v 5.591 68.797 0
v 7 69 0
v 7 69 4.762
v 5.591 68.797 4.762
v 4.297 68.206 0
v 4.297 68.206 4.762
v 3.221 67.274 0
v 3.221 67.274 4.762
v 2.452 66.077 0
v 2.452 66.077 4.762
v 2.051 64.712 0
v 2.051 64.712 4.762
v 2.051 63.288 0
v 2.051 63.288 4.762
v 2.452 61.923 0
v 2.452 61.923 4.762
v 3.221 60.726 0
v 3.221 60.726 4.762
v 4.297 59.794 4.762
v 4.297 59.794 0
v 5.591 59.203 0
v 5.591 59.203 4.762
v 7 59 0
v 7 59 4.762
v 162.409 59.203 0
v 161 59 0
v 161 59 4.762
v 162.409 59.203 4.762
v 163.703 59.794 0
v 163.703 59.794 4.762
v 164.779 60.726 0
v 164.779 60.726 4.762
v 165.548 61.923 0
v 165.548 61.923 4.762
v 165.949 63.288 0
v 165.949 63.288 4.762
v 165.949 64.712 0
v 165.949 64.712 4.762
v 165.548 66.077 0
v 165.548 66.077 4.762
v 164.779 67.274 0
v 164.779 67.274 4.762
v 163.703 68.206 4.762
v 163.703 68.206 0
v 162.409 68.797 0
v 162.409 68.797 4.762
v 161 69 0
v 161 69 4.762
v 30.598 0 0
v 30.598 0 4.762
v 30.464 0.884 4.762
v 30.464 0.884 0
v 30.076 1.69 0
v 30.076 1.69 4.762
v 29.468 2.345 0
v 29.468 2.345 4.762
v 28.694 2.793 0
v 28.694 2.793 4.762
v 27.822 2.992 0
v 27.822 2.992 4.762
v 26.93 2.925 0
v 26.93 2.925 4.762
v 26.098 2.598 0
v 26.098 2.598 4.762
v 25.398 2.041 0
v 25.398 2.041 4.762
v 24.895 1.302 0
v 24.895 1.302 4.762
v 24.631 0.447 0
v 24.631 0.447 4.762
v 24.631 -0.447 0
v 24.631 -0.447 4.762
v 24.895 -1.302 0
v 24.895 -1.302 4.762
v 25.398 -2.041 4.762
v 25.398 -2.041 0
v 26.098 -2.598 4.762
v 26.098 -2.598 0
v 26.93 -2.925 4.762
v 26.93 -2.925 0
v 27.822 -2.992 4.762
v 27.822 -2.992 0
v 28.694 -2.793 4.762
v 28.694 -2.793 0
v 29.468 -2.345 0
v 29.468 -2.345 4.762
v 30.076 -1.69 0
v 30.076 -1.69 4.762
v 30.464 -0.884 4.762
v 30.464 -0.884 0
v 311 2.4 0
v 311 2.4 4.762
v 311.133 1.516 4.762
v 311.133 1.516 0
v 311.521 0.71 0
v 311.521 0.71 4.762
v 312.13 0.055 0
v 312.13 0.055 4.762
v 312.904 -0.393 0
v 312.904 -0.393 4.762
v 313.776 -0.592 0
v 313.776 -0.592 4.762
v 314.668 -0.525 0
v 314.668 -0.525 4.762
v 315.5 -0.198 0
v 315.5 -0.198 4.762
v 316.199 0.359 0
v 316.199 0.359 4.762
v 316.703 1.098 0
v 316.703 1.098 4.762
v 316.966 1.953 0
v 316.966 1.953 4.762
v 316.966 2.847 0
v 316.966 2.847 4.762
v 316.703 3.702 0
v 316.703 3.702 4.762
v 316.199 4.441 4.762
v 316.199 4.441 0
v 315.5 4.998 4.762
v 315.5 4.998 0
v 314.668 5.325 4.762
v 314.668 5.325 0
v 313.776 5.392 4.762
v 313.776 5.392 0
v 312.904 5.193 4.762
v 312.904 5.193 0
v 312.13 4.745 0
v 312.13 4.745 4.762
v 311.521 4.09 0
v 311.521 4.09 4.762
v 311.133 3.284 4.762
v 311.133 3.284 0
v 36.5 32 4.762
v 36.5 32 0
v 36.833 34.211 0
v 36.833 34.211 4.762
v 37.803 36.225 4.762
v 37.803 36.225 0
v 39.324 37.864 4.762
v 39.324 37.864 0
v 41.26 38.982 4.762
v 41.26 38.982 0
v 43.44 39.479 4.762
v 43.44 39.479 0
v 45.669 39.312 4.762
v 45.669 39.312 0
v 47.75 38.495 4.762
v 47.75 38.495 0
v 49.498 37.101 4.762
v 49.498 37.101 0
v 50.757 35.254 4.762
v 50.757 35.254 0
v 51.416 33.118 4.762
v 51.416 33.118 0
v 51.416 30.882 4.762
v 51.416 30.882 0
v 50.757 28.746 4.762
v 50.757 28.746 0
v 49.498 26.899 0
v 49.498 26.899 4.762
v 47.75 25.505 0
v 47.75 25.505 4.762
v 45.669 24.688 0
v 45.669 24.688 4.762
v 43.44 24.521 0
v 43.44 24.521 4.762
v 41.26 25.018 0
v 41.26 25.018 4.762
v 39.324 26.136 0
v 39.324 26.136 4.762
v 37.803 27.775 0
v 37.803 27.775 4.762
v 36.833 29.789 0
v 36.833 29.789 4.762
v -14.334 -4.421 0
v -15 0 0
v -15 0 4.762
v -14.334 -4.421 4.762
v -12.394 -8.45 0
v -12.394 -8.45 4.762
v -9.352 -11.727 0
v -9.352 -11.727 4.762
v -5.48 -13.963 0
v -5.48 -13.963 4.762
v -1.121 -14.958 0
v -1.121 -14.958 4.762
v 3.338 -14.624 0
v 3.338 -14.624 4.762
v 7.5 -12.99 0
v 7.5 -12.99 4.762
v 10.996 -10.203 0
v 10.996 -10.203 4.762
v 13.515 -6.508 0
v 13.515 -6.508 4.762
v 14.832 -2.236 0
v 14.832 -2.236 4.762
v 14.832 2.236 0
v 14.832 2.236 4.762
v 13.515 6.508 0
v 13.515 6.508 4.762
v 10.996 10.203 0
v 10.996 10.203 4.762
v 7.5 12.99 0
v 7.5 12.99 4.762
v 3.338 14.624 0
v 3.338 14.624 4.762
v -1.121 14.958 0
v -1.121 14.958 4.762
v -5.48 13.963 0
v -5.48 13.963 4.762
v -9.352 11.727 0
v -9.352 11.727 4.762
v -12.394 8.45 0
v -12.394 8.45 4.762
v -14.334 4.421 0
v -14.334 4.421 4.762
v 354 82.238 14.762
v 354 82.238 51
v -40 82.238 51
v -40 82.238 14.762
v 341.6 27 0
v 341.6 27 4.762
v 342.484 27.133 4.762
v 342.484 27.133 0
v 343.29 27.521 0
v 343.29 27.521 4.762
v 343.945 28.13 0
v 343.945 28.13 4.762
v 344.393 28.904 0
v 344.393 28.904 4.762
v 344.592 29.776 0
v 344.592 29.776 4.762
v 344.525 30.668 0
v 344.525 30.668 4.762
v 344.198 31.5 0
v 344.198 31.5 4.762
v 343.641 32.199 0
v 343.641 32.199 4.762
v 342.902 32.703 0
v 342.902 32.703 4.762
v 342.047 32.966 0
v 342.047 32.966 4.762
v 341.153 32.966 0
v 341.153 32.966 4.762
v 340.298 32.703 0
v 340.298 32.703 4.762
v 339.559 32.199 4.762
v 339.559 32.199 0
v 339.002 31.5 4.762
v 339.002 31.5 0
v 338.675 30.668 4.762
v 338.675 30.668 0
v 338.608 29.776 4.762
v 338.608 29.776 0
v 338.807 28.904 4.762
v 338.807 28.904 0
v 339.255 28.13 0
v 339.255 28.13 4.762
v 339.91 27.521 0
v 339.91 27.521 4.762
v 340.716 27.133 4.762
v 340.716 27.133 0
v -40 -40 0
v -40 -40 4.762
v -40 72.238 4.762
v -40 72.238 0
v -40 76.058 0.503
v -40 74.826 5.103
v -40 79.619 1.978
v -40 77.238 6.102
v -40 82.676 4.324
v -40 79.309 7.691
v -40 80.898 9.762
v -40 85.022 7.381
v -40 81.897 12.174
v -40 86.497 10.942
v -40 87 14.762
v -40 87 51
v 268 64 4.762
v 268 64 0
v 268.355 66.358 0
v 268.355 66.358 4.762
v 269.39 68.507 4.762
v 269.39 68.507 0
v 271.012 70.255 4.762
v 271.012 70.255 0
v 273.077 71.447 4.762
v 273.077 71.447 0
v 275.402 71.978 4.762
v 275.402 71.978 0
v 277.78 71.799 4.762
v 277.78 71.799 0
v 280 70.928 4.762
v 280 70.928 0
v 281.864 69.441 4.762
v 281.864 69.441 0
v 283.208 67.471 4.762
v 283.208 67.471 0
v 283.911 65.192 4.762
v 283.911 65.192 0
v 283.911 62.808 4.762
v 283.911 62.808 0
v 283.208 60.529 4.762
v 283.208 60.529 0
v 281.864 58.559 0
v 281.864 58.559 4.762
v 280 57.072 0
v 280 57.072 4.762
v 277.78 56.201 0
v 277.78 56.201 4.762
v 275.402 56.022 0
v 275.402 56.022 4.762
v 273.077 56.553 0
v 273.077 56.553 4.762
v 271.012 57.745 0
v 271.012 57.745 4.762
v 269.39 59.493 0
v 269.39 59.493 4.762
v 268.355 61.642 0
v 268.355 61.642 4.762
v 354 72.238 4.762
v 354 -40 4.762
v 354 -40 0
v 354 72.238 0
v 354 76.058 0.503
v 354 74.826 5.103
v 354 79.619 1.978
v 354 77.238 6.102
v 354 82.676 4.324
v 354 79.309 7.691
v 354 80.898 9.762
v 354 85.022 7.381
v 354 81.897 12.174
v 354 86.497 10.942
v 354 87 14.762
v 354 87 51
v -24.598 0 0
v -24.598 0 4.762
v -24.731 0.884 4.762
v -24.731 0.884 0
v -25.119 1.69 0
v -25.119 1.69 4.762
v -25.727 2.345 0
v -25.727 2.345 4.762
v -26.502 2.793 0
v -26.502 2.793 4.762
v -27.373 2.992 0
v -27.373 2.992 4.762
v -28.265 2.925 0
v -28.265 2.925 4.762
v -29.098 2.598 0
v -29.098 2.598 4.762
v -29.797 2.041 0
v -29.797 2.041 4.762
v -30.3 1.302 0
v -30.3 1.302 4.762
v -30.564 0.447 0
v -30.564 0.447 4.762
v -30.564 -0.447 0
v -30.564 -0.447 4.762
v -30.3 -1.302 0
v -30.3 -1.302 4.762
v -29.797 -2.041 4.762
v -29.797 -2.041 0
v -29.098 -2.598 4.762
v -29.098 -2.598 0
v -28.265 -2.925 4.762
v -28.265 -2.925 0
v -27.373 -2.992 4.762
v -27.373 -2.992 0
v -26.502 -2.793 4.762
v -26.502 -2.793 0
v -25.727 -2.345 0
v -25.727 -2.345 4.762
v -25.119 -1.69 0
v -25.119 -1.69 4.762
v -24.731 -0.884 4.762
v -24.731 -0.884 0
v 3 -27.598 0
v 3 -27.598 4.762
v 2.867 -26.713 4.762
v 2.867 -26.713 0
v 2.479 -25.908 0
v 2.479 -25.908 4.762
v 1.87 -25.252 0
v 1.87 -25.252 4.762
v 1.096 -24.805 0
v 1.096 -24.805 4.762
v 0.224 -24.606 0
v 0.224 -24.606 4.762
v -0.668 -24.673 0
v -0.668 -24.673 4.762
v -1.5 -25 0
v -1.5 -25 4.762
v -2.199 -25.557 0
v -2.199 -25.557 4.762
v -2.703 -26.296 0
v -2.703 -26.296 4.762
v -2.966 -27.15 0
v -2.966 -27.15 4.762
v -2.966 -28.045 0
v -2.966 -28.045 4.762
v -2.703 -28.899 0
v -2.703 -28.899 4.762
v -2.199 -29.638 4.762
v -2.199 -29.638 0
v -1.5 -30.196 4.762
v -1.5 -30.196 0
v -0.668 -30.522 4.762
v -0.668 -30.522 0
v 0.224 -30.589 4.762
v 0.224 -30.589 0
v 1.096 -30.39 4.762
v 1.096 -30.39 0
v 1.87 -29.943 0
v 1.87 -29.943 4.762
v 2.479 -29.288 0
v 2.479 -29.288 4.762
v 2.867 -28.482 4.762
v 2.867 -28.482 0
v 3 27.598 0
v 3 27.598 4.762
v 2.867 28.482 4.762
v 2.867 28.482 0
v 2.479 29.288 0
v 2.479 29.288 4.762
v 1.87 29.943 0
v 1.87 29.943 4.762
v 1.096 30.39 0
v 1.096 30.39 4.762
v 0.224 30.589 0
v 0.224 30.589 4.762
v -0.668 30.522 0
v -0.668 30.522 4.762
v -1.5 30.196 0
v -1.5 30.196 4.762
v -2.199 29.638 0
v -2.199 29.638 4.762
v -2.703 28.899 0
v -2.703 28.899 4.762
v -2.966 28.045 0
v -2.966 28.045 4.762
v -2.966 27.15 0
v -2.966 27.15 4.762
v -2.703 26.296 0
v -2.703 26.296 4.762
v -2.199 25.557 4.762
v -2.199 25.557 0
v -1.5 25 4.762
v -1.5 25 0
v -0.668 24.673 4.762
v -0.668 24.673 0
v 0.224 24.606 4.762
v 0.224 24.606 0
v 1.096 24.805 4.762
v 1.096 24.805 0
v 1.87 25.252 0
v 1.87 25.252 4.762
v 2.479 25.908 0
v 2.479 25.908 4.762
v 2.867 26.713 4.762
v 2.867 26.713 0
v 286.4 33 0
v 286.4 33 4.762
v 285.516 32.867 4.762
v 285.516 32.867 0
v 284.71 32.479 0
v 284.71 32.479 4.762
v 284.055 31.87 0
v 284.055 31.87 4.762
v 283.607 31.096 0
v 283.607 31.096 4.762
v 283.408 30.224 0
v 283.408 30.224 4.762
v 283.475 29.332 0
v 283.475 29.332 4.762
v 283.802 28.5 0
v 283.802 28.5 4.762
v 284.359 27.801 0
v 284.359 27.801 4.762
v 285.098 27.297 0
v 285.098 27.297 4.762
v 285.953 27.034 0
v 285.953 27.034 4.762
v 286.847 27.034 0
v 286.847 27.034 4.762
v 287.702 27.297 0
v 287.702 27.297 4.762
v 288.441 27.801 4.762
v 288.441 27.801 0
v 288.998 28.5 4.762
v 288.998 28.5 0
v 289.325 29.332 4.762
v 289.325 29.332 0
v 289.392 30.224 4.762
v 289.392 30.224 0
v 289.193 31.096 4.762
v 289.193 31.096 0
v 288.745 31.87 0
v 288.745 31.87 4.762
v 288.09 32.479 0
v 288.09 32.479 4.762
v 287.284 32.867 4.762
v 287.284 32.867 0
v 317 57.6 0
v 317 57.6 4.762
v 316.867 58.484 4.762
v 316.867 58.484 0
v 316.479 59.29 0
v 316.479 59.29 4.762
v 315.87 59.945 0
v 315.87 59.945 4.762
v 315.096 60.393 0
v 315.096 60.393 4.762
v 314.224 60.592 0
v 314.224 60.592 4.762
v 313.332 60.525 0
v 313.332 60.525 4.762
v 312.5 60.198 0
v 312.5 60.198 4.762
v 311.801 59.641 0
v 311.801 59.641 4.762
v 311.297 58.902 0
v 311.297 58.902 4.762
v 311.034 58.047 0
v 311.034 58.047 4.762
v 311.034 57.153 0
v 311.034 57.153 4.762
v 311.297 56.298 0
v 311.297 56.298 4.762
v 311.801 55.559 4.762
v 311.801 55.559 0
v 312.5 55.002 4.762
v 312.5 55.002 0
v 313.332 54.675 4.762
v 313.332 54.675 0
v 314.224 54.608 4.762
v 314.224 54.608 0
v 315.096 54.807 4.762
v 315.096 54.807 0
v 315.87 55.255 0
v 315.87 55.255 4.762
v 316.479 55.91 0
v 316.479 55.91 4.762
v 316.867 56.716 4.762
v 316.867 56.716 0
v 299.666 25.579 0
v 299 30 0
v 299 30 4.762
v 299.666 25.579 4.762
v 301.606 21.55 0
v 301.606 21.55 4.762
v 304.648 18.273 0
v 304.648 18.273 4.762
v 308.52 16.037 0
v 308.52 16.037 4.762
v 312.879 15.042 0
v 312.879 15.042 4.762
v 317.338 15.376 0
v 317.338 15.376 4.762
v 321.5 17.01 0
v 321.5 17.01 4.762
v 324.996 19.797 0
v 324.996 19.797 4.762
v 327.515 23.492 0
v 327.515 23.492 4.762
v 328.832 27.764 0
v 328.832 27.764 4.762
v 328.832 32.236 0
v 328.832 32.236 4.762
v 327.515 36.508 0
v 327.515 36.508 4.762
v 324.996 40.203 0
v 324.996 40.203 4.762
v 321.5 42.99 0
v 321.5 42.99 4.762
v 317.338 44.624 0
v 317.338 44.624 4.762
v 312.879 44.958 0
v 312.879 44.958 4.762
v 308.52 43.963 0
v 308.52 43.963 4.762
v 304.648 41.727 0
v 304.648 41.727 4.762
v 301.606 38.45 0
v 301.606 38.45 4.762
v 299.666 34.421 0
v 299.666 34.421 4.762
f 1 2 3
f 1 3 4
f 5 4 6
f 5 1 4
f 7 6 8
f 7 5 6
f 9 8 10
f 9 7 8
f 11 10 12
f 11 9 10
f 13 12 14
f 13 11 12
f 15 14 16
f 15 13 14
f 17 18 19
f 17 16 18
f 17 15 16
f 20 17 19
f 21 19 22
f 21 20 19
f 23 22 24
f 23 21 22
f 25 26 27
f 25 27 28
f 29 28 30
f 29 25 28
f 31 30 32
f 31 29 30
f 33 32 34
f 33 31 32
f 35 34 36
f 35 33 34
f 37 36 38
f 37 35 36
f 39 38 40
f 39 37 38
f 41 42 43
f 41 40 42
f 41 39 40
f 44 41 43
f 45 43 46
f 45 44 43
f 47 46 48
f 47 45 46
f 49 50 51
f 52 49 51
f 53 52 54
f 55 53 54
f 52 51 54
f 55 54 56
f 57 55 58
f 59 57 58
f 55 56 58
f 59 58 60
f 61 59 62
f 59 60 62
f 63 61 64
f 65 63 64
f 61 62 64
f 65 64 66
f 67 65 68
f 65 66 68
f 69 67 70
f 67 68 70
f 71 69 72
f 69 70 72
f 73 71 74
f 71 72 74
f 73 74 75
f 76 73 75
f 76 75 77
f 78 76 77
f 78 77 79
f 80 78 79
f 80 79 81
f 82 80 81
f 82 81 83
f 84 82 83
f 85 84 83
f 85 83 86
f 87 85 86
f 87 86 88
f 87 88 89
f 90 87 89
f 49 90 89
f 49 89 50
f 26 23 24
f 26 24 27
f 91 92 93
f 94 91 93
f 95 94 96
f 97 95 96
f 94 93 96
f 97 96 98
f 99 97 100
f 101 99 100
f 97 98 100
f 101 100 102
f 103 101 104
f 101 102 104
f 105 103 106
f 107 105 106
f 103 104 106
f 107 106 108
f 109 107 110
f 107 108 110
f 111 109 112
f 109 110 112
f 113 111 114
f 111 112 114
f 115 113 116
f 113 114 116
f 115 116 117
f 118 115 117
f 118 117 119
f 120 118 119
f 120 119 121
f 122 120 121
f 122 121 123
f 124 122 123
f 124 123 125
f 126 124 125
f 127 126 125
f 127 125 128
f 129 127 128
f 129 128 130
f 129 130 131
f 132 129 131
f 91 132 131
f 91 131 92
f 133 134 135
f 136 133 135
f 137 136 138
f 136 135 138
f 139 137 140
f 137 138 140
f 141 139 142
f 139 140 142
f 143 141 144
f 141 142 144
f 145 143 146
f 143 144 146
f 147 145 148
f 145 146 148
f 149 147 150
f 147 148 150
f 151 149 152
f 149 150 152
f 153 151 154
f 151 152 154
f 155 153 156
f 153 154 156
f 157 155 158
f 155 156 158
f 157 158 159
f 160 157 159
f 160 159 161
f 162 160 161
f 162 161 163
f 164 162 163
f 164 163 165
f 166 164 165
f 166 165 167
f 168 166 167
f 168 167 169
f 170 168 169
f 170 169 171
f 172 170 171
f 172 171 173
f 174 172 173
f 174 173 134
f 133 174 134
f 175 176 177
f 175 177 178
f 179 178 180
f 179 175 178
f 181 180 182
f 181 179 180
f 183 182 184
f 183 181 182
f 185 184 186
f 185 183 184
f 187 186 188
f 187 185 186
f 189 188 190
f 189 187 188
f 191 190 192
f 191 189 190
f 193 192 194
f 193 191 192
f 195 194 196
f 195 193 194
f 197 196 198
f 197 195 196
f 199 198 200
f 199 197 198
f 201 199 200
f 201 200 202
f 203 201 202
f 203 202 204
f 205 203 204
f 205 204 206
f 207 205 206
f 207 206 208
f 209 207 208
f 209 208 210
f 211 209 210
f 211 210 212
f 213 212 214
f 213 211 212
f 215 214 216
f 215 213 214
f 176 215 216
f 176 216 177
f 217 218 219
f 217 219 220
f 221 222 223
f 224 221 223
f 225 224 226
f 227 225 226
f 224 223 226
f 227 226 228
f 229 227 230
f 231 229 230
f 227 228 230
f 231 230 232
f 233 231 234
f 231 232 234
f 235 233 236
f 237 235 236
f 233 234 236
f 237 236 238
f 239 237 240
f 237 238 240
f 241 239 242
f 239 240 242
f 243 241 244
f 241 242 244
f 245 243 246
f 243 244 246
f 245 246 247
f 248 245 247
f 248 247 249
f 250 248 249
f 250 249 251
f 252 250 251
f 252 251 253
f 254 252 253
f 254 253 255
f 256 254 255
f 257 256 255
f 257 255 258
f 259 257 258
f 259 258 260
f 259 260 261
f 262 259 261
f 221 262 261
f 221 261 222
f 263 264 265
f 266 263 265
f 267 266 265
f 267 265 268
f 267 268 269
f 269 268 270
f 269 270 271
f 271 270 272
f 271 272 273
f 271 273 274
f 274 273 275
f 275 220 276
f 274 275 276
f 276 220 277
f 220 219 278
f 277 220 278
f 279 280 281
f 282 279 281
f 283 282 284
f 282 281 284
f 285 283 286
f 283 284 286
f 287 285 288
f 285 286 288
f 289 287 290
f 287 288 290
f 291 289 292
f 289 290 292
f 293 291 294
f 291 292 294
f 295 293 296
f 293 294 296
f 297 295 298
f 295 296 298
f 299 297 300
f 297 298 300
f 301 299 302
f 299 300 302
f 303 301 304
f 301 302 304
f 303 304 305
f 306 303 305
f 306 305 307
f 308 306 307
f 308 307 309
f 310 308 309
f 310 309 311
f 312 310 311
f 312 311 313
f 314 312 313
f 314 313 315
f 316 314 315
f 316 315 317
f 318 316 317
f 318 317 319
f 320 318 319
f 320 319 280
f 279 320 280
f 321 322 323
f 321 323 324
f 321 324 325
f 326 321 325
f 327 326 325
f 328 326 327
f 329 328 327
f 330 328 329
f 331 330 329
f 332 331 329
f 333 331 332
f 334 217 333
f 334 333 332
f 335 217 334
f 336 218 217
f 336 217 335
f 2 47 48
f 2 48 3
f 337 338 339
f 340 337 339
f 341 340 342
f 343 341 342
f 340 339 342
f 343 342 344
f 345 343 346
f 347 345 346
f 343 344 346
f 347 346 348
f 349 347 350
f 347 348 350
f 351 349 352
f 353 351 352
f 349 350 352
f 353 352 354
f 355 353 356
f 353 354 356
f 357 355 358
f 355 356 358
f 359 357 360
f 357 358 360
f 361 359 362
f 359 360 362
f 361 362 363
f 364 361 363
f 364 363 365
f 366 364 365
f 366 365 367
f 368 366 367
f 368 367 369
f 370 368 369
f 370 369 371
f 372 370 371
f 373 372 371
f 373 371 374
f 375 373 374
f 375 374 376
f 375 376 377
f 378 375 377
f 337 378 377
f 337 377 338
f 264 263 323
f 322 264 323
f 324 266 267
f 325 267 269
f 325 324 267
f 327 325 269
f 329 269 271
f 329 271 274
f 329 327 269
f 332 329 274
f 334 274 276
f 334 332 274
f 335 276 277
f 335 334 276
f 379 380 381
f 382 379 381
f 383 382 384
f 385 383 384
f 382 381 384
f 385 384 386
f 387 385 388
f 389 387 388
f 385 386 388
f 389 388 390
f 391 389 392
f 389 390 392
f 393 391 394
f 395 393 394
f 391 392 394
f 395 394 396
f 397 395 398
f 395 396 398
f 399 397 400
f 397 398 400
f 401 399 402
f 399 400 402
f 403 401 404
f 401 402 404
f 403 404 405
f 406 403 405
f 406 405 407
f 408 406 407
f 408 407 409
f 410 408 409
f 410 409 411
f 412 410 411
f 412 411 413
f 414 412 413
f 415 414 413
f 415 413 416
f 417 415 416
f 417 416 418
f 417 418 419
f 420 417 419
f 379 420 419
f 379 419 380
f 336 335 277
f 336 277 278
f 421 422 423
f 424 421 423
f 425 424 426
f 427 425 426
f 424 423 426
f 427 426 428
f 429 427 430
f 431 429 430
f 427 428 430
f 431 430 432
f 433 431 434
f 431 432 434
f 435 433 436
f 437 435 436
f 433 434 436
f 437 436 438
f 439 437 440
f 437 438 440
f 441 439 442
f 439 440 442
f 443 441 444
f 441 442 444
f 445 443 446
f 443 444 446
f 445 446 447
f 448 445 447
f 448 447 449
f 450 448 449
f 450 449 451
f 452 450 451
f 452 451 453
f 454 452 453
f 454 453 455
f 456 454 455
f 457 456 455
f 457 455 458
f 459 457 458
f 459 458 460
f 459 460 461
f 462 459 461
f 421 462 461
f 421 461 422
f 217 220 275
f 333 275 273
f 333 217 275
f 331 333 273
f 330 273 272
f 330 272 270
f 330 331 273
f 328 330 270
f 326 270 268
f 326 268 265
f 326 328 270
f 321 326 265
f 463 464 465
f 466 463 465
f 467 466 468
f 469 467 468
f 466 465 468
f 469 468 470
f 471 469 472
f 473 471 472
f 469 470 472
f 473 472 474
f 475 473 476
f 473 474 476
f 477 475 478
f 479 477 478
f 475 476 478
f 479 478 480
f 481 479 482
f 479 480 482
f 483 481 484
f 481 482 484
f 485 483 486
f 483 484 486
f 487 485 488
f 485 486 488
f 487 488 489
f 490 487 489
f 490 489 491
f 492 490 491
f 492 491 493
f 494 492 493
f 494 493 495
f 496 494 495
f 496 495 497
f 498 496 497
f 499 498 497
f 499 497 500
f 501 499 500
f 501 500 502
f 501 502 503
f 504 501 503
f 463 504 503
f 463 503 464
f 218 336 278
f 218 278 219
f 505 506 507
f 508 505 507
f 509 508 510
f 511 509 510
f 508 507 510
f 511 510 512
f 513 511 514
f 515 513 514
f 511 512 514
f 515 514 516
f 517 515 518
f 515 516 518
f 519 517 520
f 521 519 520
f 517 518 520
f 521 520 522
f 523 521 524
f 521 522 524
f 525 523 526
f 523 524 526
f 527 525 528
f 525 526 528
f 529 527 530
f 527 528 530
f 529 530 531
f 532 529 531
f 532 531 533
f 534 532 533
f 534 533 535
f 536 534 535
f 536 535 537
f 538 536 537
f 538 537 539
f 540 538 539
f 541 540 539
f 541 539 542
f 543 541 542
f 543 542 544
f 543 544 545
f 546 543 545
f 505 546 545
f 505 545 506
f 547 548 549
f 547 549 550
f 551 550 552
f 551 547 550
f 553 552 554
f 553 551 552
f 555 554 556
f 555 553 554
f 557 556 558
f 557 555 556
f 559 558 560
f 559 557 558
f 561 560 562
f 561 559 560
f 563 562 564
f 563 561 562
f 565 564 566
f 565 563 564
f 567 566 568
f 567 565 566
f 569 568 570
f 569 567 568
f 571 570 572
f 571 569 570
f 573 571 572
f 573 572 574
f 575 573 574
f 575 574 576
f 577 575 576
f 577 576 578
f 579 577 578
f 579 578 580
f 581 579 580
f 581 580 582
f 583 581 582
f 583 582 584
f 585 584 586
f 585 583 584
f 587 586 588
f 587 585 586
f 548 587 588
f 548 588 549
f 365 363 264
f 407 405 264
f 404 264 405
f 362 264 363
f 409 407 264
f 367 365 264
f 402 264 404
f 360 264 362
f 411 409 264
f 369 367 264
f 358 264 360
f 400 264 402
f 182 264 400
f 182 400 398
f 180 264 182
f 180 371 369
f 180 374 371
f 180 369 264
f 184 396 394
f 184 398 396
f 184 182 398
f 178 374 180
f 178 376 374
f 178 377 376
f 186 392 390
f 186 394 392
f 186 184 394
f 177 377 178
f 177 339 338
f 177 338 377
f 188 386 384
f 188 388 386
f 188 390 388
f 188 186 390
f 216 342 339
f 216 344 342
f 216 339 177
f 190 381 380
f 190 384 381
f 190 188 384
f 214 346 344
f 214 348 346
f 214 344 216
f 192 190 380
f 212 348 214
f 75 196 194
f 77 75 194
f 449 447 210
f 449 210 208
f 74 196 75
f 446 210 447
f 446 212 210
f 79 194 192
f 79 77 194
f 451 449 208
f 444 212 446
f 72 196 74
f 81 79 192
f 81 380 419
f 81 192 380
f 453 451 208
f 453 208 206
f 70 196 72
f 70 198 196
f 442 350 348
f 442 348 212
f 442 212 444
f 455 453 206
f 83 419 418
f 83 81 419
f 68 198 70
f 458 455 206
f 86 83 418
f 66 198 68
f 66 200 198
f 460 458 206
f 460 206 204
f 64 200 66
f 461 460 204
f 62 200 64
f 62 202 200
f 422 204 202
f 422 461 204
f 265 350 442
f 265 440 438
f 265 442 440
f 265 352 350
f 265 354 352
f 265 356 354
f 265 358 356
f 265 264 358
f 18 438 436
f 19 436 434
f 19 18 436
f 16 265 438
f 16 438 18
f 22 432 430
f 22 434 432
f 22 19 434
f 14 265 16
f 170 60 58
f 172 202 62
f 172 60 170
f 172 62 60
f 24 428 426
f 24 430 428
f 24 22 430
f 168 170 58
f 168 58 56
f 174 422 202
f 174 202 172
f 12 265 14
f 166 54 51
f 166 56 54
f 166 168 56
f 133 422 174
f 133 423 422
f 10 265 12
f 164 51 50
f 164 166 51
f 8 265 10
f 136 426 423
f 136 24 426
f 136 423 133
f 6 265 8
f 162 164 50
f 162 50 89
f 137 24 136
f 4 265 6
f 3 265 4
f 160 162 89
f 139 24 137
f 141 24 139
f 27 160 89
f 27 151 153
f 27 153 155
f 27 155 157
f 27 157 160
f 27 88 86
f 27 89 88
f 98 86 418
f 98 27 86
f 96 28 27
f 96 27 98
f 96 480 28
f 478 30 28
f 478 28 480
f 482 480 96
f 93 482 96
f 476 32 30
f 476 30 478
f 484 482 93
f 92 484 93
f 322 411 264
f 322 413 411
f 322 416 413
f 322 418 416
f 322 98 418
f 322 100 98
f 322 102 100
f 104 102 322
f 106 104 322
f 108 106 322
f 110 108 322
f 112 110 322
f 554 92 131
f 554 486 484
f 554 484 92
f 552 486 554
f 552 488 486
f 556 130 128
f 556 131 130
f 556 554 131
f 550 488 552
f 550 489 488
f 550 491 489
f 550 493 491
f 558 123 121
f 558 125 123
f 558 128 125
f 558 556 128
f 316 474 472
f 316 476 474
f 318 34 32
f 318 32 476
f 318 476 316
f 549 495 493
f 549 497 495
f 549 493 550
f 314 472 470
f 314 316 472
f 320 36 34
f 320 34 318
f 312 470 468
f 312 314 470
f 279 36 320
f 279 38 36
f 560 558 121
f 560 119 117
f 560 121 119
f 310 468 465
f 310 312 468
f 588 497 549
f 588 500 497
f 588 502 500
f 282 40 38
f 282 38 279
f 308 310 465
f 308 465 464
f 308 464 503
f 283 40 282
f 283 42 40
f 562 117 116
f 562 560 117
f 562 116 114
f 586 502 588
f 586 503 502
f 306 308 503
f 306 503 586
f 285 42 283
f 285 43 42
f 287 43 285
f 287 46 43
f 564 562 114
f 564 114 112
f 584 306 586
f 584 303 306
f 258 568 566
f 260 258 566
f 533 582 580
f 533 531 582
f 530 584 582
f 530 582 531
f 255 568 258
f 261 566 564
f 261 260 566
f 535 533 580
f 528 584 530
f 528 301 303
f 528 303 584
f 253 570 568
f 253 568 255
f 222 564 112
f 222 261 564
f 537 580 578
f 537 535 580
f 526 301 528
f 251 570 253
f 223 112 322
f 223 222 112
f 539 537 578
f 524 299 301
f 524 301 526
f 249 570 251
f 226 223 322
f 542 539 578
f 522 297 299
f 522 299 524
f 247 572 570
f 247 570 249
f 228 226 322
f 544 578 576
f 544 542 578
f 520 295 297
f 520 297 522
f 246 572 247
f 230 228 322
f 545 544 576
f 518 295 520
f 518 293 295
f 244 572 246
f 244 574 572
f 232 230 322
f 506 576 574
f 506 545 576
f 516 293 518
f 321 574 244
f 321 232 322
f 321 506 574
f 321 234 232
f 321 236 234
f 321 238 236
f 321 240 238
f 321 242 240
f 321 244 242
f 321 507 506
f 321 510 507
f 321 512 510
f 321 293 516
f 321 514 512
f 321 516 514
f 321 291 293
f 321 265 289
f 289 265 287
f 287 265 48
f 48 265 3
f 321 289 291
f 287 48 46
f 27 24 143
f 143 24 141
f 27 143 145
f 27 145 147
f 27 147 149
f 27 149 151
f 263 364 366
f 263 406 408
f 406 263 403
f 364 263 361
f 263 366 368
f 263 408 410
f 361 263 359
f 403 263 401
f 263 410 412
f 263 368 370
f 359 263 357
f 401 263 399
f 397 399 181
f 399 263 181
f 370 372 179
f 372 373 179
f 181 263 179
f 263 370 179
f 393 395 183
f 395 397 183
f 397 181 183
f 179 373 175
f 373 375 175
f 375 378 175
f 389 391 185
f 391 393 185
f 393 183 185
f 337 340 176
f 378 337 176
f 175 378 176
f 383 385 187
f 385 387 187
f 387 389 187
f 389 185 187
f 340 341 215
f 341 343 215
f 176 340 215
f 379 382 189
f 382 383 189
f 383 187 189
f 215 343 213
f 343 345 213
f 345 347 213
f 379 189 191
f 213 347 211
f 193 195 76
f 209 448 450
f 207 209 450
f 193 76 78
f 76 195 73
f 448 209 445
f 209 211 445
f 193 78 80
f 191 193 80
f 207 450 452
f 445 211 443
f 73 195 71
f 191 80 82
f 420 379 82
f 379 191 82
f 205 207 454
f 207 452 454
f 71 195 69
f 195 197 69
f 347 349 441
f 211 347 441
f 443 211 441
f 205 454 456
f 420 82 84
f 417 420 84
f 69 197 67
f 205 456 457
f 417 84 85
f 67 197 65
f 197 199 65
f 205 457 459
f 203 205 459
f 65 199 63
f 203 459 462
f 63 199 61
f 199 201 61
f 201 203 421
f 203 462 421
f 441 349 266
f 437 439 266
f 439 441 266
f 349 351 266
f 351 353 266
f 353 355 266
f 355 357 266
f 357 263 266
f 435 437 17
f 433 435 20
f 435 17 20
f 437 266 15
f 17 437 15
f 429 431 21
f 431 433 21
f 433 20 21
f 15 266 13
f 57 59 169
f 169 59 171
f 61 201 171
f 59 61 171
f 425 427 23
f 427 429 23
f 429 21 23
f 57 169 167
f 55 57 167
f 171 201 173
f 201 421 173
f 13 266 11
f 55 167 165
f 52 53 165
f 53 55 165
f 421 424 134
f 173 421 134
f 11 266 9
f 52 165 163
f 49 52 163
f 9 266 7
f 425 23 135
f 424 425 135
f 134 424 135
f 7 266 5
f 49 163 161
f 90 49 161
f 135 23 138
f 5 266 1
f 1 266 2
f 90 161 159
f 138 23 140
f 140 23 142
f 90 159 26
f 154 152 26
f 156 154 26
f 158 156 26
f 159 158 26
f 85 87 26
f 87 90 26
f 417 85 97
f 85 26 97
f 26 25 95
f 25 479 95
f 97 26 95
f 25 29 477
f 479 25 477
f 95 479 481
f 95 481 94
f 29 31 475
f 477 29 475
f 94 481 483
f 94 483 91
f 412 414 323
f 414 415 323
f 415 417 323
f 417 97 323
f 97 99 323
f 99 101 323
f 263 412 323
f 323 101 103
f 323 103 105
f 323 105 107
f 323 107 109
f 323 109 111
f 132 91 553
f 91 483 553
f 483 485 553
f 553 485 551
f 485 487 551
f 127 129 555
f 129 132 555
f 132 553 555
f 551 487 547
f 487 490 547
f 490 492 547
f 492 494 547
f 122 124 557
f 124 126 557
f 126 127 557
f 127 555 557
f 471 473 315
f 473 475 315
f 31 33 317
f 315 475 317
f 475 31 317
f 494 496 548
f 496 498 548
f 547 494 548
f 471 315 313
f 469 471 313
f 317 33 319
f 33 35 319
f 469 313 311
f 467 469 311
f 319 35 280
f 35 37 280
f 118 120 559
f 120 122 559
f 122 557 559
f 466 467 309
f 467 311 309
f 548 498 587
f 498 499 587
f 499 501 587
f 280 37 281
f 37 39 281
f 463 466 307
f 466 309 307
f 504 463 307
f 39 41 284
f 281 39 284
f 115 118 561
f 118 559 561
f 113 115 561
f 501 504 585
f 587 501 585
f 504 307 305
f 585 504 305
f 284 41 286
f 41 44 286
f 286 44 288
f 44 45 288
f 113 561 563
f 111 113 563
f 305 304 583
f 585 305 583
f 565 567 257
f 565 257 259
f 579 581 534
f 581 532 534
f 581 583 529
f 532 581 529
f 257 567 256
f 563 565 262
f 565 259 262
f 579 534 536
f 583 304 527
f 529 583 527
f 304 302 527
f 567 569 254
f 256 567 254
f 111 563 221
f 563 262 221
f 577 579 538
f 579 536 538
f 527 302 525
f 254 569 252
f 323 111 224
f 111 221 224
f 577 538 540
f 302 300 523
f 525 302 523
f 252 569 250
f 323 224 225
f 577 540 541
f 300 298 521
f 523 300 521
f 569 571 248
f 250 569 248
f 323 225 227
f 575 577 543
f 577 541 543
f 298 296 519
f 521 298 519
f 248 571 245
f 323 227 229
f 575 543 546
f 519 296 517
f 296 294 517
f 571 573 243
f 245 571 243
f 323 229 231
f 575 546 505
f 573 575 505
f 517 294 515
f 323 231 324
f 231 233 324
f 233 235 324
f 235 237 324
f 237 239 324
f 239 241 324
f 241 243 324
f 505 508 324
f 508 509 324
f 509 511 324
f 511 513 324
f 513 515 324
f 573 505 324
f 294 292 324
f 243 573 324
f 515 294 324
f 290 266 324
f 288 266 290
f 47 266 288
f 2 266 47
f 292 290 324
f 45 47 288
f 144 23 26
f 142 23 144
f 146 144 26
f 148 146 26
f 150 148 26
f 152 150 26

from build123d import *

# Parameters (mm, degrees)
CROQUIS1_W                       = 394
CROQUIS1_H                       = 127
CROQUIS1_R                       = 15
SALIENTE_EXTRUIR1_DEPTH          = 4.7625
CROQUIS2_R                       = 3
CORTAR_EXTRUIR1_DEPTH            = 365.565057851
CROQUIS3_R                       = 3
CORTAR_EXTRUIR2_DEPTH            = 365.565057851
MATRIZC1_COUNT                   = 4
BRIDA_DE_ARISTA1_STRIP_W         = 39.05
BRIDA_DE_ARISTA1_STRIP_H         = 4.7625
BRIDA_DE_ARISTA1_STRIP_CUT_DEPTH = 394
BRIDA_DE_ARISTA1_DEPTH           = 394
CORTAR_EXTRUIR3_DEPTH            = 369.084229491
CROQUIS15_R                      = 7.5
CORTAR_EXTRUIR4_DEPTH            = 369.084229491
CROQUIS16_R                      = 8
CORTAR_EXTRUIR5_DEPTH            = 369.084229491


# Sheet-metal steps are written as plain solids
with BuildPart() as part:
    # Croquis1 → Saliente-Extruir1 (new body)
    with BuildSketch(Plane.XY):
        with Locations((157, 23.5)):
            Rectangle(CROQUIS1_W, CROQUIS1_H)
        with Locations(Location((0, 0, 0), (0, 0, 180))):
            Circle(CROQUIS1_R, mode=Mode.SUBTRACT)
        with Locations(Location((314, 30, 0), (0, 0, 180))):
            Circle(CROQUIS1_R, mode=Mode.SUBTRACT)
    extrude(amount=SALIENTE_EXTRUIR1_DEPTH)

    # Croquis2 → Cortar-Extruir1 (cut, through all)
    with BuildSketch(Plane.XY.offset(4.7625)):
        with Locations((0, 27.597586589)):
            Circle(CROQUIS2_R)
        with Locations((27.597586589, 0)):
            Circle(CROQUIS2_R)
        with Locations((0, -27.597586589)):
            Circle(CROQUIS2_R)
        with Locations((-27.597586589, 0)):
            Circle(CROQUIS2_R)
    extrude(amount=-CORTAR_EXTRUIR1_DEPTH, mode=Mode.SUBTRACT)

    # Croquis3 → Cortar-Extruir2 (cut, through all)
    with BuildSketch(Plane.XY.offset(4.7625)):
        with Locations((314, 57.6)):
            Circle(CROQUIS3_R)
    cortar_extruir2 = extrude(amount=-CORTAR_EXTRUIR2_DEPTH, mode=Mode.SUBTRACT)

    # MatrizC1: Cortar-Extruir2 ×4 about axis
    matrizc1_axis = Axis((314, 30, 0), (0, 0, 1))
    for i in range(1, MATRIZC1_COUNT):
        add(cortar_extruir2.rotate(matrizc1_axis, i * 360 / MATRIZC1_COUNT), mode=Mode.SUBTRACT)

    # Brida de arista1 strip (across the edge) → Brida de arista1 strip cut (cut)
    with BuildSketch(Plane(origin=(354, 87, 4.7625), x_dir=(0, -1, 0), z_dir=(-1, 0, 0))):
        with Locations((-4.7625, -2.38125)):
            Rectangle(BRIDA_DE_ARISTA1_STRIP_W, BRIDA_DE_ARISTA1_STRIP_H)
    extrude(amount=BRIDA_DE_ARISTA1_STRIP_CUT_DEPTH, mode=Mode.SUBTRACT)

    # Brida de arista1 section (across the edge) → Brida de arista1 (add)
    with BuildSketch(Plane(origin=(354, 87, 4.7625), x_dir=(0, -1, 0), z_dir=(-1, 0, 0))):
        with BuildLine():
            Line((0, 10), (0, 46.2375))
            Line((0, 46.2375), (4.7625, 46.2375))
            Line((4.7625, 46.2375), (4.7625, 10))
            ThreePointArc((4.7625, 10), (7.691432188, 2.928932188), (14.7625, 0))
            Line((14.7625, 0), (14.7625, -4.7625))
            ThreePointArc((14.7625, -4.7625), (4.323836143, -0.438663857), (0, 10))
        make_face()
    extrude(amount=BRIDA_DE_ARISTA1_DEPTH)

    # Croquis14 → Cortar-Extruir3 (cut, through all)
    with BuildSketch(Plane(origin=(0, 0, 0), x_dir=(-1, 0, 0), z_dir=(0, 0, -1))):
        with BuildLine():
            Line((-7, 59), (-161, 59))
            ThreePointArc((-161, 59), (-166, 64), (-161, 69))
            Line((-161, 69), (-7, 69))
            ThreePointArc((-7, 69), (-2, 64), (-7, 59))
        make_face()
    extrude(amount=-CORTAR_EXTRUIR3_DEPTH, mode=Mode.SUBTRACT)

    # Croquis15 → Cortar-Extruir4 (cut, through all)
    with BuildSketch(Plane(origin=(0, 0, 0), x_dir=(-1, 0, 0), z_dir=(0, 0, -1))):
        with Locations((-44, 32)):
            Circle(CROQUIS15_R)
    extrude(amount=-CORTAR_EXTRUIR4_DEPTH, mode=Mode.SUBTRACT)

    # Croquis16 → Cortar-Extruir5 (cut, through all)
    with BuildSketch(Plane(origin=(0, 0, 0), x_dir=(-1, 0, 0), z_dir=(0, 0, -1))):
        with Locations((-276, 64)):
            Circle(CROQUIS16_R)
    extrude(amount=-CORTAR_EXTRUIR5_DEPTH, mode=Mode.SUBTRACT)


solid = part.part
